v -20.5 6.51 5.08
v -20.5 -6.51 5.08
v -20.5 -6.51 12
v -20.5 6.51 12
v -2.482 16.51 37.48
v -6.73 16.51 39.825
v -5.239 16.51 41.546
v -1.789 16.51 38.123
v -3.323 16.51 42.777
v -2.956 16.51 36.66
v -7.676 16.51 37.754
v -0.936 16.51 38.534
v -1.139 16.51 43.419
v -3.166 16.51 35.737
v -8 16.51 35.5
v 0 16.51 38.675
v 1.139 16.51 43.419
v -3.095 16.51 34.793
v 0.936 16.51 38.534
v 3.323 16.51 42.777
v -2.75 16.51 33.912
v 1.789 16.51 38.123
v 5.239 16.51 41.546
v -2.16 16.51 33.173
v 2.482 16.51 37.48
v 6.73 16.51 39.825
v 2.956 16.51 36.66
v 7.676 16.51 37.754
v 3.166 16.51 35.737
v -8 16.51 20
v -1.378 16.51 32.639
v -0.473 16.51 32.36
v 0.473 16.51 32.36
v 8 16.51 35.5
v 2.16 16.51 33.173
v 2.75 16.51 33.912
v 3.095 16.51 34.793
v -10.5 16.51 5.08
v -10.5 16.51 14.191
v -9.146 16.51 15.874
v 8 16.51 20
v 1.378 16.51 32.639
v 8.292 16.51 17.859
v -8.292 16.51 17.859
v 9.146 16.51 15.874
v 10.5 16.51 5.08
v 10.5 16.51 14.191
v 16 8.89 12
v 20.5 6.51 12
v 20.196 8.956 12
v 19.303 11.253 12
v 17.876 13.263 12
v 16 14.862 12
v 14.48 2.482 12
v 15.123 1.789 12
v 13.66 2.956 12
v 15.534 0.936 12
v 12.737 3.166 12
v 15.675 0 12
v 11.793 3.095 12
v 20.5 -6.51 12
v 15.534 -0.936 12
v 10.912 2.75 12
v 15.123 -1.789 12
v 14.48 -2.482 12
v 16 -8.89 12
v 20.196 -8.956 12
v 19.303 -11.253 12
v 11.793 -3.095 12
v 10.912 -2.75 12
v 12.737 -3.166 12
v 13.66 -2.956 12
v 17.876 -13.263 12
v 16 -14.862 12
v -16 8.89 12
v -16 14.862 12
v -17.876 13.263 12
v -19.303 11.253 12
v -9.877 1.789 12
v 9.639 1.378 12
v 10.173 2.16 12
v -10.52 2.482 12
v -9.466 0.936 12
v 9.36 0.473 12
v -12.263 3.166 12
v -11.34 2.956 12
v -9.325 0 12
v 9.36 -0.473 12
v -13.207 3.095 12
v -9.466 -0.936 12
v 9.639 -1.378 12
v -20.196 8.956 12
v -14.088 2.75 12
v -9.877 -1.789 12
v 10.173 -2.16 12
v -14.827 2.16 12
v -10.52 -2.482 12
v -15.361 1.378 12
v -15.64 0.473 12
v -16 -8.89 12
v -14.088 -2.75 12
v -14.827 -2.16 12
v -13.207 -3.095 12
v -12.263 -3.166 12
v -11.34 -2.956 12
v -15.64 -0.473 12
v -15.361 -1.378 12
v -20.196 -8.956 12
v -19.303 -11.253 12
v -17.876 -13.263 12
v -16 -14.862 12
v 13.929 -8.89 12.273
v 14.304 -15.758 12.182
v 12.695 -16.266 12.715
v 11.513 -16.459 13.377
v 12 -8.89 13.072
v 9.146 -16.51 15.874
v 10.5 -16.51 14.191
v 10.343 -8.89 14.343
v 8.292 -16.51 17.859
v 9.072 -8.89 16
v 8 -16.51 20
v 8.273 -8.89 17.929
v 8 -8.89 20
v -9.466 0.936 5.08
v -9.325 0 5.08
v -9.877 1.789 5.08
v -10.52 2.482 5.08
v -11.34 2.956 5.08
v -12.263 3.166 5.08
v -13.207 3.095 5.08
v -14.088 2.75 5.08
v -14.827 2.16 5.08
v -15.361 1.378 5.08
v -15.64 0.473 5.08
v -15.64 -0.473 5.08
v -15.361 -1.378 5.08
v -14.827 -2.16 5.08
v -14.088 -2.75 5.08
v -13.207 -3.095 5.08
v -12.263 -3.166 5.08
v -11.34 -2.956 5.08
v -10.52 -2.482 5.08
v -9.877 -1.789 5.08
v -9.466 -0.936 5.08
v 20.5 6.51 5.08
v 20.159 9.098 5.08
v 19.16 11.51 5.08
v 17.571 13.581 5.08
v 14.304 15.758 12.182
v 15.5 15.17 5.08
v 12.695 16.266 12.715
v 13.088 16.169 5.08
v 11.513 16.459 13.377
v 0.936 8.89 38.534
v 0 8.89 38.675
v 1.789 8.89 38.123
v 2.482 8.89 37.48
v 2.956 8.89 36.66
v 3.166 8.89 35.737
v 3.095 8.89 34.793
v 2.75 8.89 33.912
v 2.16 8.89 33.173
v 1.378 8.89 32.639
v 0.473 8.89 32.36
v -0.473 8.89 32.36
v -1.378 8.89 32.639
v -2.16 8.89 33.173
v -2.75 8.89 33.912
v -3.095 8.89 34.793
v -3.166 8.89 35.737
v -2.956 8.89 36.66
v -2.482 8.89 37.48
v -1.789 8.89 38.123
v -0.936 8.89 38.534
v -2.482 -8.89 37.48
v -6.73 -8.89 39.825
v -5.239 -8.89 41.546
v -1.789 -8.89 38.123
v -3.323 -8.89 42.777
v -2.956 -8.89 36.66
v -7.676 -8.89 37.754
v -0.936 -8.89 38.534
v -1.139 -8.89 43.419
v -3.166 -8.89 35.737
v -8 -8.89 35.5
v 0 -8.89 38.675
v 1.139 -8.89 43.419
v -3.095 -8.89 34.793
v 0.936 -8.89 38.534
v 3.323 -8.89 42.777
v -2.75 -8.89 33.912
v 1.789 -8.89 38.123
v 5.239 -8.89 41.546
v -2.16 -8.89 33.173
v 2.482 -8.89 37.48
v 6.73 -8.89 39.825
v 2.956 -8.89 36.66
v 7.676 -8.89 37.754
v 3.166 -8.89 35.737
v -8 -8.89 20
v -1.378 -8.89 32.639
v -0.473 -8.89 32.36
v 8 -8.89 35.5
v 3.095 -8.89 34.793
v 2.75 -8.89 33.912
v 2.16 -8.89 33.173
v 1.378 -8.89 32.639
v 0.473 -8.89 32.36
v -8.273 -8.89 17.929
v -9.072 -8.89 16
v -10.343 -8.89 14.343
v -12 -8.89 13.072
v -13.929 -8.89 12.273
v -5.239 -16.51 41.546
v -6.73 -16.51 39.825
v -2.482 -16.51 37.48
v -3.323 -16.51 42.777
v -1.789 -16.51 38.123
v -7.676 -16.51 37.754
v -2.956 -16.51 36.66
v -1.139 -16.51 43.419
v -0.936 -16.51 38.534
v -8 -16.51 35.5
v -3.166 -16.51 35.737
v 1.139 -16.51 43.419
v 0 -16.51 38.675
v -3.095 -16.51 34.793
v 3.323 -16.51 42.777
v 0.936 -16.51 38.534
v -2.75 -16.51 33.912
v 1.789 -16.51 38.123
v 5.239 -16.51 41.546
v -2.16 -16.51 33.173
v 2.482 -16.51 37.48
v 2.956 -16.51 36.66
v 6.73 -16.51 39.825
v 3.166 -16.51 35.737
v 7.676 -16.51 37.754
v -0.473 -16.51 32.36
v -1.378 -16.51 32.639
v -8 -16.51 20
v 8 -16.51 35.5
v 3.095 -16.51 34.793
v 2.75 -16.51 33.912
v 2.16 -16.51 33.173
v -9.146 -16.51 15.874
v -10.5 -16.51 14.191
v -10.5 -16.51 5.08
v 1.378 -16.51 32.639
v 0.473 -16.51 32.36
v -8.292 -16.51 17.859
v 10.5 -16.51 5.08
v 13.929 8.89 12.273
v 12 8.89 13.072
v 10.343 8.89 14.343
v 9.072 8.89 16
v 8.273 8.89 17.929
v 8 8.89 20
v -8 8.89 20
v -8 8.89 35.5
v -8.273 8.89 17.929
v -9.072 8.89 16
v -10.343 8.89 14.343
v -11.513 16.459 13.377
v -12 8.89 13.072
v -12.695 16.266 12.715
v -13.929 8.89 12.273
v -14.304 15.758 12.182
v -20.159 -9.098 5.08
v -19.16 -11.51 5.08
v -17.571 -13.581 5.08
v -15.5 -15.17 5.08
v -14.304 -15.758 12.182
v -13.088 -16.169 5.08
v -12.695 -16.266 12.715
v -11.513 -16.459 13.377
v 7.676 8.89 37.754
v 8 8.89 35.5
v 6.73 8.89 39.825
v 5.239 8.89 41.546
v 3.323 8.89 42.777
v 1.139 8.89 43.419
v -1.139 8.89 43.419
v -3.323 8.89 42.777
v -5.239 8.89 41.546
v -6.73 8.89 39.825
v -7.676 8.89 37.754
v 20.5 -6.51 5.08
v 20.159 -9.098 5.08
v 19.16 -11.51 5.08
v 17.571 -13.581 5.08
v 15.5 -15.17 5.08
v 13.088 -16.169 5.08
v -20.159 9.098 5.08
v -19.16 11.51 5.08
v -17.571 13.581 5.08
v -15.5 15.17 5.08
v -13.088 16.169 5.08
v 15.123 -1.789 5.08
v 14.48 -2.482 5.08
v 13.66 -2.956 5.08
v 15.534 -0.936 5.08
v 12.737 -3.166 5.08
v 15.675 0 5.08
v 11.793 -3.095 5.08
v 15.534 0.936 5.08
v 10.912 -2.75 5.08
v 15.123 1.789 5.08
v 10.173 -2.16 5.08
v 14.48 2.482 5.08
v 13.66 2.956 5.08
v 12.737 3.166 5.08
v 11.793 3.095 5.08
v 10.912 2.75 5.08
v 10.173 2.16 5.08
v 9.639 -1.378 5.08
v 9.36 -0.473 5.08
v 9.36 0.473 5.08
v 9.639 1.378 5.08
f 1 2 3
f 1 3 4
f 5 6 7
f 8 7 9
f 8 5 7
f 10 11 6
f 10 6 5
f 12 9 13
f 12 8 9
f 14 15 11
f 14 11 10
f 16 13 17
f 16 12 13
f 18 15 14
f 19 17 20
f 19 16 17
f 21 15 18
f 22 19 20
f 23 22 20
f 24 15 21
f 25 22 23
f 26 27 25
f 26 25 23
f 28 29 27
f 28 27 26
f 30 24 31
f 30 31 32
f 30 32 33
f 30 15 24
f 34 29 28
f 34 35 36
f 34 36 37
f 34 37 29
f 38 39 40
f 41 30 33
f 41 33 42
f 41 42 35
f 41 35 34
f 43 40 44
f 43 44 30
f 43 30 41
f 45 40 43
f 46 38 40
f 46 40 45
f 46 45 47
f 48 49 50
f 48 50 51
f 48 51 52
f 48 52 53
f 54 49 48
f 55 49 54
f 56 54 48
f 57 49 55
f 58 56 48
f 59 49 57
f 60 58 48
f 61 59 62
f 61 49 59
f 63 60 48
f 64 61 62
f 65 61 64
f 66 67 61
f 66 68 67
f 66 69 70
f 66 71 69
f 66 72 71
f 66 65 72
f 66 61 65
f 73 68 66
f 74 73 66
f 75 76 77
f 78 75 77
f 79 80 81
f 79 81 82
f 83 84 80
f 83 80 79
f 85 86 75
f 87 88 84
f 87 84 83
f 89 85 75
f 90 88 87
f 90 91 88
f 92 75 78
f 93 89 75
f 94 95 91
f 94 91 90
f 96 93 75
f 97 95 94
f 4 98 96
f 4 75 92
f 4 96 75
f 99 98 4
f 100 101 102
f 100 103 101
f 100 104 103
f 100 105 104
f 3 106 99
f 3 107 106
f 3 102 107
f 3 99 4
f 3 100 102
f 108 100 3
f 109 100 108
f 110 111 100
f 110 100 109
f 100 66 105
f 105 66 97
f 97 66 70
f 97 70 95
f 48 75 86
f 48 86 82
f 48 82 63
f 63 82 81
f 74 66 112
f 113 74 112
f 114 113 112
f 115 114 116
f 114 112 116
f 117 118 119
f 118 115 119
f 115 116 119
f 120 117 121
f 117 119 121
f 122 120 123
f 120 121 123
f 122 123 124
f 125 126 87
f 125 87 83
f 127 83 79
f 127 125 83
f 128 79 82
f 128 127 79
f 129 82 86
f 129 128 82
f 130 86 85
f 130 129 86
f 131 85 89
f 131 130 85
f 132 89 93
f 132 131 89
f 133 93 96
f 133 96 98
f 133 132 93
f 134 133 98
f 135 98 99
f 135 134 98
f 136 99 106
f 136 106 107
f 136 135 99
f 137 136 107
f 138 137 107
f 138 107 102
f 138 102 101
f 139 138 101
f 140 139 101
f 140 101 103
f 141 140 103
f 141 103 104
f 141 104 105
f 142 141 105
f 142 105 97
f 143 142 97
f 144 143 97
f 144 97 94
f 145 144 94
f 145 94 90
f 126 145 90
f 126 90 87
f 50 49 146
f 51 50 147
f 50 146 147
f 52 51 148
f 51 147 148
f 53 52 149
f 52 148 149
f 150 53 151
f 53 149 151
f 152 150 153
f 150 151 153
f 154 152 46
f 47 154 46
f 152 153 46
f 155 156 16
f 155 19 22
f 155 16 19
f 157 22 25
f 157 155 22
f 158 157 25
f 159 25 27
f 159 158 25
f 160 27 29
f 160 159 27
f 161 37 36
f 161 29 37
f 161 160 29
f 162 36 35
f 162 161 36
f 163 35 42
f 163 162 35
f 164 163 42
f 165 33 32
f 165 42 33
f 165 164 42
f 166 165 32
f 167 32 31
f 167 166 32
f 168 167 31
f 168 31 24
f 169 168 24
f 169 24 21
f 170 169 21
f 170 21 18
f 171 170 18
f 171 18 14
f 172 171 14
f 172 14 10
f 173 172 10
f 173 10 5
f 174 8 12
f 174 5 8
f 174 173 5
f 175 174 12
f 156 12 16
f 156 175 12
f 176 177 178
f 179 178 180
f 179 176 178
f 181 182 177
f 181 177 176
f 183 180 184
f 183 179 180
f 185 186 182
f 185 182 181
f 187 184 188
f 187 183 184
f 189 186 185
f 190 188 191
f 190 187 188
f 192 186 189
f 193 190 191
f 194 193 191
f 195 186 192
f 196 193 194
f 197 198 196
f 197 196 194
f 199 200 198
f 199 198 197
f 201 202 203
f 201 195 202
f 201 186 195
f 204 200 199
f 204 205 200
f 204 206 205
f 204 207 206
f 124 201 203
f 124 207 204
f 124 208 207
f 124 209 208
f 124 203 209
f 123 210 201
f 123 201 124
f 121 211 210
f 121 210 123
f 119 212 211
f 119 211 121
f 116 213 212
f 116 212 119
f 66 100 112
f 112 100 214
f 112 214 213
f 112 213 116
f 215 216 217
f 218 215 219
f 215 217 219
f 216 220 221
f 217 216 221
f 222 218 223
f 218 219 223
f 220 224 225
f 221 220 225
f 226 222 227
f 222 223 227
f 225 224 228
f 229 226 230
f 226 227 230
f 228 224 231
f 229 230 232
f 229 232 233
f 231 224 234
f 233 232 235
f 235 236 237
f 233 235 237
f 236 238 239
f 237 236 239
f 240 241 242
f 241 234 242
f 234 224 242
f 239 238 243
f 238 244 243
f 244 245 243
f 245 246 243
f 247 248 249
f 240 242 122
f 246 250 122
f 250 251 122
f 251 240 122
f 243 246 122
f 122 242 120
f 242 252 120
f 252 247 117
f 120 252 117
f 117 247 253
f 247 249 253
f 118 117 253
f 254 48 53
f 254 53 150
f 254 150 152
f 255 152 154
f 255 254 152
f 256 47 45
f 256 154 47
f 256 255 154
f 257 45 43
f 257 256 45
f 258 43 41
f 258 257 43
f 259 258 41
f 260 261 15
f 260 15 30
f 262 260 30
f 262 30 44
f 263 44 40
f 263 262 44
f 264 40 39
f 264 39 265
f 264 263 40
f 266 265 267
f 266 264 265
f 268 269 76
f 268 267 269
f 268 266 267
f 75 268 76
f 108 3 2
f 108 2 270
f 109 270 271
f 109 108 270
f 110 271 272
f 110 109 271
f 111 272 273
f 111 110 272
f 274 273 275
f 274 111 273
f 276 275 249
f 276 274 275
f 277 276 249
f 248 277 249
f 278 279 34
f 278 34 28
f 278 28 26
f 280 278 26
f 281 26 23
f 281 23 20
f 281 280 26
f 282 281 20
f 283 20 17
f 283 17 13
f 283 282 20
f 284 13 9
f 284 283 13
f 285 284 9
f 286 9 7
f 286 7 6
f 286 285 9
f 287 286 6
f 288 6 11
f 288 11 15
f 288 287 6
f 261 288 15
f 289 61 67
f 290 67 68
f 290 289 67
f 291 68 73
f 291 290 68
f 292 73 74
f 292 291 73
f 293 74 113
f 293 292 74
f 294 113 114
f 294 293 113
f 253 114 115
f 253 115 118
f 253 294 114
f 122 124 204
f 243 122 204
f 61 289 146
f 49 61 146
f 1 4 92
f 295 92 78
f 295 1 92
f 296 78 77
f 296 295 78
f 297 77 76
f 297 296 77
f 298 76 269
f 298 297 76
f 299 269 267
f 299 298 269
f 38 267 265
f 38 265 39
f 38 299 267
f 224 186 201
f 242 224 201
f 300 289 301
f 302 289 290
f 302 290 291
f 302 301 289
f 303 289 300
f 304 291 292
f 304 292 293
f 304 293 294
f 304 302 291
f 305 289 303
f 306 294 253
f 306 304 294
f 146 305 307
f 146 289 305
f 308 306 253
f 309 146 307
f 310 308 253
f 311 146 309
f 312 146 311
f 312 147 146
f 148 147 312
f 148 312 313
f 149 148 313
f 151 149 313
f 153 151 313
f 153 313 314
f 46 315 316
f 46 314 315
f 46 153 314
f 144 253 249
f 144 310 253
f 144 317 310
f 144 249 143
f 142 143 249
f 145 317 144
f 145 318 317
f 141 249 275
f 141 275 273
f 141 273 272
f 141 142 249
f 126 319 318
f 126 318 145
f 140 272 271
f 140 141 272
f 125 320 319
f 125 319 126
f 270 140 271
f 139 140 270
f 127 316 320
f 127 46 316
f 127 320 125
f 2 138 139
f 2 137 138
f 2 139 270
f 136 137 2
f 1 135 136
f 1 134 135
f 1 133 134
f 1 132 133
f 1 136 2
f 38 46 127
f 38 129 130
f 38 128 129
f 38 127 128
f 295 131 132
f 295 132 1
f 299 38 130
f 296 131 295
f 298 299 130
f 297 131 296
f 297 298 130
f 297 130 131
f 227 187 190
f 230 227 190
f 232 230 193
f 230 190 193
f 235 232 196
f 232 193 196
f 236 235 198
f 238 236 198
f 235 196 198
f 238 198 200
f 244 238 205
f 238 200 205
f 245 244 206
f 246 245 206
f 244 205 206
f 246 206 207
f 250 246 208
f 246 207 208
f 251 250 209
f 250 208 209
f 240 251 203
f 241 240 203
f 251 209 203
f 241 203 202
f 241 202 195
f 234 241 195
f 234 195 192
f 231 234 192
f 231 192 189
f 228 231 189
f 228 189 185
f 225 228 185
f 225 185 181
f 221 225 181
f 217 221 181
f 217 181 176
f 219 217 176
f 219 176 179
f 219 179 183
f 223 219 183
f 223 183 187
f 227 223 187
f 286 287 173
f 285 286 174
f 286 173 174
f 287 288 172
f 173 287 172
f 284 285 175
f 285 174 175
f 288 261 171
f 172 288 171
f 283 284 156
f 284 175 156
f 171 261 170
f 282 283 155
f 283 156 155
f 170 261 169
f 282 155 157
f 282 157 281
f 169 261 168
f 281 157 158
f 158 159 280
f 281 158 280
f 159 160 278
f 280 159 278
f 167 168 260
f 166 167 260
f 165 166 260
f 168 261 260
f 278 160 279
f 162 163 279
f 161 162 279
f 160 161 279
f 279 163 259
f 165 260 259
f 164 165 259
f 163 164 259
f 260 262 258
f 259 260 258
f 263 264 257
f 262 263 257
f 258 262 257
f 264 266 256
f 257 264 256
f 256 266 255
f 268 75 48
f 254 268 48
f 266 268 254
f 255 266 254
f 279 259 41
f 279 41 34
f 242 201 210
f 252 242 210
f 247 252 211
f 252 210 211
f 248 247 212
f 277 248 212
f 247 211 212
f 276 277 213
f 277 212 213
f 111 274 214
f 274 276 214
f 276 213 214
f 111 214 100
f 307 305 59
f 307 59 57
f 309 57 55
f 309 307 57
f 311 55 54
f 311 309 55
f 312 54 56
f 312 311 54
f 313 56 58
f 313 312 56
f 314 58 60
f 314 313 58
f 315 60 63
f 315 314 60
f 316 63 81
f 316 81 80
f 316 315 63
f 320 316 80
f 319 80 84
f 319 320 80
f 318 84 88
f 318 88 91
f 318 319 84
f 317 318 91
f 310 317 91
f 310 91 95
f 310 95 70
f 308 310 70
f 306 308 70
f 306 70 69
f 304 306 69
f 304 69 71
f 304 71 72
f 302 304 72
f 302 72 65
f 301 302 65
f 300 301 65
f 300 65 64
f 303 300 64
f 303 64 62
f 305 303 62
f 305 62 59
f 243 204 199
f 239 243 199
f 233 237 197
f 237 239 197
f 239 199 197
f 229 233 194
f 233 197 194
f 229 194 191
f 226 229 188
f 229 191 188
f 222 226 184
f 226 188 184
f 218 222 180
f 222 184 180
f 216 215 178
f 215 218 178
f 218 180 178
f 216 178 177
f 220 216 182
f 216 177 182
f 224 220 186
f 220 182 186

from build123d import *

# Parameters (mm, degrees)
SKETCH1_W                      = 41
SKETCH1_H                      = 33.02
SKETCH1_R                      = 3.175
BOSS_EXTRUDE1_DEPTH            = 12
SKETCH2_W                      = 41
SKETCH2_H                      = 7.62
BOSS_EXTRUDE2_DEPTH            = 53
CUT_EXTRUDE1_REACH             = 72.127
SKETCH4_R                      = 3.175
CUT_EXTRUDE1_DIRECTION_2_REACH = 72.127
CUT_EXTRUDE3_REACH             = 72.127
CUT_EXTRUDE3_DIRECTION_2_REACH = 72.127
FILLET1_R                      = 10
CUT_EXTRUDE4_DEPTH             = 5.08


with BuildPart() as part:
    # Sketch1 → Boss-Extrude1 (new body)
    with BuildSketch(Plane.XY):
        Rectangle(SKETCH1_W, SKETCH1_H)
        with Locations((12.5, 0)):
            Circle(SKETCH1_R, mode=Mode.SUBTRACT)
        with Locations((-12.5, 0)):
            Circle(SKETCH1_R, mode=Mode.SUBTRACT)
    extrude(amount=BOSS_EXTRUDE1_DEPTH)

    # Sketch2 → Boss-Extrude2 (add)
    with BuildSketch(Plane.XY.offset(12)):
        with Locations((0, 12.7)):
            Rectangle(SKETCH2_W, SKETCH2_H)
        with Locations((0, -12.7)):
            Rectangle(SKETCH2_W, SKETCH2_H)
    extrude(amount=BOSS_EXTRUDE2_DEPTH)

    # Cut-Extrude1: up to this face of the body (flat: up to its plane)
    cut_extrude1_end = Plane(part.part.faces().sort_by_distance((0, -16.51, 32.5))[0])
    # Sketch4 → Cut-Extrude1 (cut, up to the picked face)
    with BuildSketch(Plane(origin=(0, 0, 0), x_dir=(1, 0, 0), z_dir=(0, 1, 0)), mode=Mode.PRIVATE) as cut_extrude1_sk1:
        with Locations(Location((0, -35.5, 0), (0, 0, 270))):
            Circle(SKETCH4_R)
    cut_extrude1_tool1 = split(extrude(cut_extrude1_sk1.sketch, amount=-CUT_EXTRUDE1_REACH, mode=Mode.PRIVATE), bisect_by=cut_extrude1_end, keep=Keep.BOTH, mode=Mode.PRIVATE)
    add(cut_extrude1_tool1.solids().sort_by(Axis((0, 0, 35.5), (0, -1, 0)))[0], mode=Mode.SUBTRACT)

    # Cut-Extrude1 direction 2: up to this face of the body (flat: up to its plane)
    cut_extrude1_direction_2_end = Plane(part.part.faces().sort_by_distance((0, 16.51, 32.5))[0])
    # Sketch4 → Cut-Extrude1 direction 2 (cut, up to the picked face)
    with BuildSketch(Plane(origin=(0, 0, 0), x_dir=(1, 0, 0), z_dir=(0, 1, 0)), mode=Mode.PRIVATE) as cut_extrude1_direction_2_sk1:
        with Locations(Location((0, -35.5, 0), (0, 0, 270))):
            Circle(SKETCH4_R)
    cut_extrude1_direction_2_tool1 = split(extrude(cut_extrude1_direction_2_sk1.sketch, amount=CUT_EXTRUDE1_DIRECTION_2_REACH, mode=Mode.PRIVATE), bisect_by=cut_extrude1_direction_2_end, keep=Keep.BOTH, mode=Mode.PRIVATE)
    add(cut_extrude1_direction_2_tool1.solids().sort_by(Axis((0, 0, 35.5), (0, 1, 0)))[0], mode=Mode.SUBTRACT)

    # Cut-Extrude3: up to this face of the body (flat: up to its plane)
    cut_extrude3_end = Plane(part.part.faces().sort_by_distance((-19.731494958, -16.51, 32.5))[0])
    # Sketch6 → Cut-Extrude3 (cut, up to the picked face)
    with BuildSketch(Plane(origin=(0, 0, 0), x_dir=(1, 0, 0), z_dir=(0, 1, 0)), mode=Mode.PRIVATE) as cut_extrude3_sk1:
        with BuildLine():
            Line((-8, -35.5), (-8, -20))
            ThreePointArc((-8, -20), (-10.343145751, -14.343145751), (-16, -12))
            Line((-16, -12), (-20.5, -12))
            Line((-20.5, -12), (-20.5, -65))
            Line((-20.5, -65), (20.5, -65))
            Line((20.5, -65), (20.5, -12))
            Line((20.5, -12), (16, -12))
            ThreePointArc((16, -12), (10.343145751, -14.343145751), (8, -20))
            Line((8, -20), (8, -35.5))
            ThreePointArc((8, -35.5), (0, -43.5), (-8, -35.5))
        make_face()
    cut_extrude3_tool1 = split(extrude(cut_extrude3_sk1.sketch, amount=-CUT_EXTRUDE3_REACH, mode=Mode.PRIVATE), bisect_by=cut_extrude3_end, keep=Keep.BOTH, mode=Mode.PRIVATE)
    add(cut_extrude3_tool1.solids().sort_by(Axis((-8.670075, 0, 27.75), (0, -1, 0)))[0], mode=Mode.SUBTRACT)

    # Cut-Extrude3 direction 2: up to this face of the body (flat: up to its plane)
    cut_extrude3_direction_2_end = Plane(part.part.faces().sort_by_distance((19.731494958, 16.51, 32.5))[0])
    # Sketch6 → Cut-Extrude3 direction 2 (cut, up to the picked face)
    with BuildSketch(Plane(origin=(0, 0, 0), x_dir=(1, 0, 0), z_dir=(0, 1, 0)), mode=Mode.PRIVATE) as cut_extrude3_direction_2_sk1:
        with BuildLine():
            Line((-8, -35.5), (-8, -20))
            ThreePointArc((-8, -20), (-10.343145751, -14.343145751), (-16, -12))
            Line((-16, -12), (-20.5, -12))
            Line((-20.5, -12), (-20.5, -65))
            Line((-20.5, -65), (20.5, -65))
            Line((20.5, -65), (20.5, -12))
            Line((20.5, -12), (16, -12))
            ThreePointArc((16, -12), (10.343145751, -14.343145751), (8, -20))
            Line((8, -20), (8, -35.5))
            ThreePointArc((8, -35.5), (0, -43.5), (-8, -35.5))
        make_face()
    cut_extrude3_direction_2_tool1 = split(extrude(cut_extrude3_direction_2_sk1.sketch, amount=CUT_EXTRUDE3_DIRECTION_2_REACH, mode=Mode.PRIVATE), bisect_by=cut_extrude3_direction_2_end, keep=Keep.BOTH, mode=Mode.PRIVATE)
    add(cut_extrude3_direction_2_tool1.solids().sort_by(Axis((-8.670075, 0, 27.75), (0, 1, 0)))[0], mode=Mode.SUBTRACT)

    # Fillet1
    fillet1_edges = [part.edges().sort_by_distance(p)[0] for p in [
        (-20.5, -16.51, 6),
        (-20.5, 16.51, 6),
        (20.5, -16.51, 6),
        (20.5, 16.51, 6),
    ]]
    fillet(fillet1_edges, radius=FILLET1_R)

    # Sketch7 → Cut-Extrude4 (cut)
    with BuildSketch(Plane(origin=(0, 0, 0), x_dir=(-1, 0, 0), z_dir=(0, 0, -1))):
        with BuildLine():
            Line((-10.5, -16.51), (10.5, -16.51))
            ThreePointArc((10.5, -16.51), (17.571067812, -13.581067812), (20.5, -6.51))
            Line((20.5, -6.51), (20.5, 6.51))
            ThreePointArc((20.5, 6.51), (17.571067812, 13.581067812), (10.5, 16.51))
            Line((10.5, 16.51), (-10.5, 16.51))
            ThreePointArc((-10.5, 16.51), (-17.571067812, 13.581067812), (-20.5, 6.51))
            Line((-20.5, 6.51), (-20.5, -6.51))
            ThreePointArc((-20.5, -6.51), (-17.571067812, -13.581067812), (-10.5, -16.51))
        make_face()
    extrude(amount=-CUT_EXTRUDE4_DEPTH, mode=Mode.SUBTRACT)


solid = part.part
